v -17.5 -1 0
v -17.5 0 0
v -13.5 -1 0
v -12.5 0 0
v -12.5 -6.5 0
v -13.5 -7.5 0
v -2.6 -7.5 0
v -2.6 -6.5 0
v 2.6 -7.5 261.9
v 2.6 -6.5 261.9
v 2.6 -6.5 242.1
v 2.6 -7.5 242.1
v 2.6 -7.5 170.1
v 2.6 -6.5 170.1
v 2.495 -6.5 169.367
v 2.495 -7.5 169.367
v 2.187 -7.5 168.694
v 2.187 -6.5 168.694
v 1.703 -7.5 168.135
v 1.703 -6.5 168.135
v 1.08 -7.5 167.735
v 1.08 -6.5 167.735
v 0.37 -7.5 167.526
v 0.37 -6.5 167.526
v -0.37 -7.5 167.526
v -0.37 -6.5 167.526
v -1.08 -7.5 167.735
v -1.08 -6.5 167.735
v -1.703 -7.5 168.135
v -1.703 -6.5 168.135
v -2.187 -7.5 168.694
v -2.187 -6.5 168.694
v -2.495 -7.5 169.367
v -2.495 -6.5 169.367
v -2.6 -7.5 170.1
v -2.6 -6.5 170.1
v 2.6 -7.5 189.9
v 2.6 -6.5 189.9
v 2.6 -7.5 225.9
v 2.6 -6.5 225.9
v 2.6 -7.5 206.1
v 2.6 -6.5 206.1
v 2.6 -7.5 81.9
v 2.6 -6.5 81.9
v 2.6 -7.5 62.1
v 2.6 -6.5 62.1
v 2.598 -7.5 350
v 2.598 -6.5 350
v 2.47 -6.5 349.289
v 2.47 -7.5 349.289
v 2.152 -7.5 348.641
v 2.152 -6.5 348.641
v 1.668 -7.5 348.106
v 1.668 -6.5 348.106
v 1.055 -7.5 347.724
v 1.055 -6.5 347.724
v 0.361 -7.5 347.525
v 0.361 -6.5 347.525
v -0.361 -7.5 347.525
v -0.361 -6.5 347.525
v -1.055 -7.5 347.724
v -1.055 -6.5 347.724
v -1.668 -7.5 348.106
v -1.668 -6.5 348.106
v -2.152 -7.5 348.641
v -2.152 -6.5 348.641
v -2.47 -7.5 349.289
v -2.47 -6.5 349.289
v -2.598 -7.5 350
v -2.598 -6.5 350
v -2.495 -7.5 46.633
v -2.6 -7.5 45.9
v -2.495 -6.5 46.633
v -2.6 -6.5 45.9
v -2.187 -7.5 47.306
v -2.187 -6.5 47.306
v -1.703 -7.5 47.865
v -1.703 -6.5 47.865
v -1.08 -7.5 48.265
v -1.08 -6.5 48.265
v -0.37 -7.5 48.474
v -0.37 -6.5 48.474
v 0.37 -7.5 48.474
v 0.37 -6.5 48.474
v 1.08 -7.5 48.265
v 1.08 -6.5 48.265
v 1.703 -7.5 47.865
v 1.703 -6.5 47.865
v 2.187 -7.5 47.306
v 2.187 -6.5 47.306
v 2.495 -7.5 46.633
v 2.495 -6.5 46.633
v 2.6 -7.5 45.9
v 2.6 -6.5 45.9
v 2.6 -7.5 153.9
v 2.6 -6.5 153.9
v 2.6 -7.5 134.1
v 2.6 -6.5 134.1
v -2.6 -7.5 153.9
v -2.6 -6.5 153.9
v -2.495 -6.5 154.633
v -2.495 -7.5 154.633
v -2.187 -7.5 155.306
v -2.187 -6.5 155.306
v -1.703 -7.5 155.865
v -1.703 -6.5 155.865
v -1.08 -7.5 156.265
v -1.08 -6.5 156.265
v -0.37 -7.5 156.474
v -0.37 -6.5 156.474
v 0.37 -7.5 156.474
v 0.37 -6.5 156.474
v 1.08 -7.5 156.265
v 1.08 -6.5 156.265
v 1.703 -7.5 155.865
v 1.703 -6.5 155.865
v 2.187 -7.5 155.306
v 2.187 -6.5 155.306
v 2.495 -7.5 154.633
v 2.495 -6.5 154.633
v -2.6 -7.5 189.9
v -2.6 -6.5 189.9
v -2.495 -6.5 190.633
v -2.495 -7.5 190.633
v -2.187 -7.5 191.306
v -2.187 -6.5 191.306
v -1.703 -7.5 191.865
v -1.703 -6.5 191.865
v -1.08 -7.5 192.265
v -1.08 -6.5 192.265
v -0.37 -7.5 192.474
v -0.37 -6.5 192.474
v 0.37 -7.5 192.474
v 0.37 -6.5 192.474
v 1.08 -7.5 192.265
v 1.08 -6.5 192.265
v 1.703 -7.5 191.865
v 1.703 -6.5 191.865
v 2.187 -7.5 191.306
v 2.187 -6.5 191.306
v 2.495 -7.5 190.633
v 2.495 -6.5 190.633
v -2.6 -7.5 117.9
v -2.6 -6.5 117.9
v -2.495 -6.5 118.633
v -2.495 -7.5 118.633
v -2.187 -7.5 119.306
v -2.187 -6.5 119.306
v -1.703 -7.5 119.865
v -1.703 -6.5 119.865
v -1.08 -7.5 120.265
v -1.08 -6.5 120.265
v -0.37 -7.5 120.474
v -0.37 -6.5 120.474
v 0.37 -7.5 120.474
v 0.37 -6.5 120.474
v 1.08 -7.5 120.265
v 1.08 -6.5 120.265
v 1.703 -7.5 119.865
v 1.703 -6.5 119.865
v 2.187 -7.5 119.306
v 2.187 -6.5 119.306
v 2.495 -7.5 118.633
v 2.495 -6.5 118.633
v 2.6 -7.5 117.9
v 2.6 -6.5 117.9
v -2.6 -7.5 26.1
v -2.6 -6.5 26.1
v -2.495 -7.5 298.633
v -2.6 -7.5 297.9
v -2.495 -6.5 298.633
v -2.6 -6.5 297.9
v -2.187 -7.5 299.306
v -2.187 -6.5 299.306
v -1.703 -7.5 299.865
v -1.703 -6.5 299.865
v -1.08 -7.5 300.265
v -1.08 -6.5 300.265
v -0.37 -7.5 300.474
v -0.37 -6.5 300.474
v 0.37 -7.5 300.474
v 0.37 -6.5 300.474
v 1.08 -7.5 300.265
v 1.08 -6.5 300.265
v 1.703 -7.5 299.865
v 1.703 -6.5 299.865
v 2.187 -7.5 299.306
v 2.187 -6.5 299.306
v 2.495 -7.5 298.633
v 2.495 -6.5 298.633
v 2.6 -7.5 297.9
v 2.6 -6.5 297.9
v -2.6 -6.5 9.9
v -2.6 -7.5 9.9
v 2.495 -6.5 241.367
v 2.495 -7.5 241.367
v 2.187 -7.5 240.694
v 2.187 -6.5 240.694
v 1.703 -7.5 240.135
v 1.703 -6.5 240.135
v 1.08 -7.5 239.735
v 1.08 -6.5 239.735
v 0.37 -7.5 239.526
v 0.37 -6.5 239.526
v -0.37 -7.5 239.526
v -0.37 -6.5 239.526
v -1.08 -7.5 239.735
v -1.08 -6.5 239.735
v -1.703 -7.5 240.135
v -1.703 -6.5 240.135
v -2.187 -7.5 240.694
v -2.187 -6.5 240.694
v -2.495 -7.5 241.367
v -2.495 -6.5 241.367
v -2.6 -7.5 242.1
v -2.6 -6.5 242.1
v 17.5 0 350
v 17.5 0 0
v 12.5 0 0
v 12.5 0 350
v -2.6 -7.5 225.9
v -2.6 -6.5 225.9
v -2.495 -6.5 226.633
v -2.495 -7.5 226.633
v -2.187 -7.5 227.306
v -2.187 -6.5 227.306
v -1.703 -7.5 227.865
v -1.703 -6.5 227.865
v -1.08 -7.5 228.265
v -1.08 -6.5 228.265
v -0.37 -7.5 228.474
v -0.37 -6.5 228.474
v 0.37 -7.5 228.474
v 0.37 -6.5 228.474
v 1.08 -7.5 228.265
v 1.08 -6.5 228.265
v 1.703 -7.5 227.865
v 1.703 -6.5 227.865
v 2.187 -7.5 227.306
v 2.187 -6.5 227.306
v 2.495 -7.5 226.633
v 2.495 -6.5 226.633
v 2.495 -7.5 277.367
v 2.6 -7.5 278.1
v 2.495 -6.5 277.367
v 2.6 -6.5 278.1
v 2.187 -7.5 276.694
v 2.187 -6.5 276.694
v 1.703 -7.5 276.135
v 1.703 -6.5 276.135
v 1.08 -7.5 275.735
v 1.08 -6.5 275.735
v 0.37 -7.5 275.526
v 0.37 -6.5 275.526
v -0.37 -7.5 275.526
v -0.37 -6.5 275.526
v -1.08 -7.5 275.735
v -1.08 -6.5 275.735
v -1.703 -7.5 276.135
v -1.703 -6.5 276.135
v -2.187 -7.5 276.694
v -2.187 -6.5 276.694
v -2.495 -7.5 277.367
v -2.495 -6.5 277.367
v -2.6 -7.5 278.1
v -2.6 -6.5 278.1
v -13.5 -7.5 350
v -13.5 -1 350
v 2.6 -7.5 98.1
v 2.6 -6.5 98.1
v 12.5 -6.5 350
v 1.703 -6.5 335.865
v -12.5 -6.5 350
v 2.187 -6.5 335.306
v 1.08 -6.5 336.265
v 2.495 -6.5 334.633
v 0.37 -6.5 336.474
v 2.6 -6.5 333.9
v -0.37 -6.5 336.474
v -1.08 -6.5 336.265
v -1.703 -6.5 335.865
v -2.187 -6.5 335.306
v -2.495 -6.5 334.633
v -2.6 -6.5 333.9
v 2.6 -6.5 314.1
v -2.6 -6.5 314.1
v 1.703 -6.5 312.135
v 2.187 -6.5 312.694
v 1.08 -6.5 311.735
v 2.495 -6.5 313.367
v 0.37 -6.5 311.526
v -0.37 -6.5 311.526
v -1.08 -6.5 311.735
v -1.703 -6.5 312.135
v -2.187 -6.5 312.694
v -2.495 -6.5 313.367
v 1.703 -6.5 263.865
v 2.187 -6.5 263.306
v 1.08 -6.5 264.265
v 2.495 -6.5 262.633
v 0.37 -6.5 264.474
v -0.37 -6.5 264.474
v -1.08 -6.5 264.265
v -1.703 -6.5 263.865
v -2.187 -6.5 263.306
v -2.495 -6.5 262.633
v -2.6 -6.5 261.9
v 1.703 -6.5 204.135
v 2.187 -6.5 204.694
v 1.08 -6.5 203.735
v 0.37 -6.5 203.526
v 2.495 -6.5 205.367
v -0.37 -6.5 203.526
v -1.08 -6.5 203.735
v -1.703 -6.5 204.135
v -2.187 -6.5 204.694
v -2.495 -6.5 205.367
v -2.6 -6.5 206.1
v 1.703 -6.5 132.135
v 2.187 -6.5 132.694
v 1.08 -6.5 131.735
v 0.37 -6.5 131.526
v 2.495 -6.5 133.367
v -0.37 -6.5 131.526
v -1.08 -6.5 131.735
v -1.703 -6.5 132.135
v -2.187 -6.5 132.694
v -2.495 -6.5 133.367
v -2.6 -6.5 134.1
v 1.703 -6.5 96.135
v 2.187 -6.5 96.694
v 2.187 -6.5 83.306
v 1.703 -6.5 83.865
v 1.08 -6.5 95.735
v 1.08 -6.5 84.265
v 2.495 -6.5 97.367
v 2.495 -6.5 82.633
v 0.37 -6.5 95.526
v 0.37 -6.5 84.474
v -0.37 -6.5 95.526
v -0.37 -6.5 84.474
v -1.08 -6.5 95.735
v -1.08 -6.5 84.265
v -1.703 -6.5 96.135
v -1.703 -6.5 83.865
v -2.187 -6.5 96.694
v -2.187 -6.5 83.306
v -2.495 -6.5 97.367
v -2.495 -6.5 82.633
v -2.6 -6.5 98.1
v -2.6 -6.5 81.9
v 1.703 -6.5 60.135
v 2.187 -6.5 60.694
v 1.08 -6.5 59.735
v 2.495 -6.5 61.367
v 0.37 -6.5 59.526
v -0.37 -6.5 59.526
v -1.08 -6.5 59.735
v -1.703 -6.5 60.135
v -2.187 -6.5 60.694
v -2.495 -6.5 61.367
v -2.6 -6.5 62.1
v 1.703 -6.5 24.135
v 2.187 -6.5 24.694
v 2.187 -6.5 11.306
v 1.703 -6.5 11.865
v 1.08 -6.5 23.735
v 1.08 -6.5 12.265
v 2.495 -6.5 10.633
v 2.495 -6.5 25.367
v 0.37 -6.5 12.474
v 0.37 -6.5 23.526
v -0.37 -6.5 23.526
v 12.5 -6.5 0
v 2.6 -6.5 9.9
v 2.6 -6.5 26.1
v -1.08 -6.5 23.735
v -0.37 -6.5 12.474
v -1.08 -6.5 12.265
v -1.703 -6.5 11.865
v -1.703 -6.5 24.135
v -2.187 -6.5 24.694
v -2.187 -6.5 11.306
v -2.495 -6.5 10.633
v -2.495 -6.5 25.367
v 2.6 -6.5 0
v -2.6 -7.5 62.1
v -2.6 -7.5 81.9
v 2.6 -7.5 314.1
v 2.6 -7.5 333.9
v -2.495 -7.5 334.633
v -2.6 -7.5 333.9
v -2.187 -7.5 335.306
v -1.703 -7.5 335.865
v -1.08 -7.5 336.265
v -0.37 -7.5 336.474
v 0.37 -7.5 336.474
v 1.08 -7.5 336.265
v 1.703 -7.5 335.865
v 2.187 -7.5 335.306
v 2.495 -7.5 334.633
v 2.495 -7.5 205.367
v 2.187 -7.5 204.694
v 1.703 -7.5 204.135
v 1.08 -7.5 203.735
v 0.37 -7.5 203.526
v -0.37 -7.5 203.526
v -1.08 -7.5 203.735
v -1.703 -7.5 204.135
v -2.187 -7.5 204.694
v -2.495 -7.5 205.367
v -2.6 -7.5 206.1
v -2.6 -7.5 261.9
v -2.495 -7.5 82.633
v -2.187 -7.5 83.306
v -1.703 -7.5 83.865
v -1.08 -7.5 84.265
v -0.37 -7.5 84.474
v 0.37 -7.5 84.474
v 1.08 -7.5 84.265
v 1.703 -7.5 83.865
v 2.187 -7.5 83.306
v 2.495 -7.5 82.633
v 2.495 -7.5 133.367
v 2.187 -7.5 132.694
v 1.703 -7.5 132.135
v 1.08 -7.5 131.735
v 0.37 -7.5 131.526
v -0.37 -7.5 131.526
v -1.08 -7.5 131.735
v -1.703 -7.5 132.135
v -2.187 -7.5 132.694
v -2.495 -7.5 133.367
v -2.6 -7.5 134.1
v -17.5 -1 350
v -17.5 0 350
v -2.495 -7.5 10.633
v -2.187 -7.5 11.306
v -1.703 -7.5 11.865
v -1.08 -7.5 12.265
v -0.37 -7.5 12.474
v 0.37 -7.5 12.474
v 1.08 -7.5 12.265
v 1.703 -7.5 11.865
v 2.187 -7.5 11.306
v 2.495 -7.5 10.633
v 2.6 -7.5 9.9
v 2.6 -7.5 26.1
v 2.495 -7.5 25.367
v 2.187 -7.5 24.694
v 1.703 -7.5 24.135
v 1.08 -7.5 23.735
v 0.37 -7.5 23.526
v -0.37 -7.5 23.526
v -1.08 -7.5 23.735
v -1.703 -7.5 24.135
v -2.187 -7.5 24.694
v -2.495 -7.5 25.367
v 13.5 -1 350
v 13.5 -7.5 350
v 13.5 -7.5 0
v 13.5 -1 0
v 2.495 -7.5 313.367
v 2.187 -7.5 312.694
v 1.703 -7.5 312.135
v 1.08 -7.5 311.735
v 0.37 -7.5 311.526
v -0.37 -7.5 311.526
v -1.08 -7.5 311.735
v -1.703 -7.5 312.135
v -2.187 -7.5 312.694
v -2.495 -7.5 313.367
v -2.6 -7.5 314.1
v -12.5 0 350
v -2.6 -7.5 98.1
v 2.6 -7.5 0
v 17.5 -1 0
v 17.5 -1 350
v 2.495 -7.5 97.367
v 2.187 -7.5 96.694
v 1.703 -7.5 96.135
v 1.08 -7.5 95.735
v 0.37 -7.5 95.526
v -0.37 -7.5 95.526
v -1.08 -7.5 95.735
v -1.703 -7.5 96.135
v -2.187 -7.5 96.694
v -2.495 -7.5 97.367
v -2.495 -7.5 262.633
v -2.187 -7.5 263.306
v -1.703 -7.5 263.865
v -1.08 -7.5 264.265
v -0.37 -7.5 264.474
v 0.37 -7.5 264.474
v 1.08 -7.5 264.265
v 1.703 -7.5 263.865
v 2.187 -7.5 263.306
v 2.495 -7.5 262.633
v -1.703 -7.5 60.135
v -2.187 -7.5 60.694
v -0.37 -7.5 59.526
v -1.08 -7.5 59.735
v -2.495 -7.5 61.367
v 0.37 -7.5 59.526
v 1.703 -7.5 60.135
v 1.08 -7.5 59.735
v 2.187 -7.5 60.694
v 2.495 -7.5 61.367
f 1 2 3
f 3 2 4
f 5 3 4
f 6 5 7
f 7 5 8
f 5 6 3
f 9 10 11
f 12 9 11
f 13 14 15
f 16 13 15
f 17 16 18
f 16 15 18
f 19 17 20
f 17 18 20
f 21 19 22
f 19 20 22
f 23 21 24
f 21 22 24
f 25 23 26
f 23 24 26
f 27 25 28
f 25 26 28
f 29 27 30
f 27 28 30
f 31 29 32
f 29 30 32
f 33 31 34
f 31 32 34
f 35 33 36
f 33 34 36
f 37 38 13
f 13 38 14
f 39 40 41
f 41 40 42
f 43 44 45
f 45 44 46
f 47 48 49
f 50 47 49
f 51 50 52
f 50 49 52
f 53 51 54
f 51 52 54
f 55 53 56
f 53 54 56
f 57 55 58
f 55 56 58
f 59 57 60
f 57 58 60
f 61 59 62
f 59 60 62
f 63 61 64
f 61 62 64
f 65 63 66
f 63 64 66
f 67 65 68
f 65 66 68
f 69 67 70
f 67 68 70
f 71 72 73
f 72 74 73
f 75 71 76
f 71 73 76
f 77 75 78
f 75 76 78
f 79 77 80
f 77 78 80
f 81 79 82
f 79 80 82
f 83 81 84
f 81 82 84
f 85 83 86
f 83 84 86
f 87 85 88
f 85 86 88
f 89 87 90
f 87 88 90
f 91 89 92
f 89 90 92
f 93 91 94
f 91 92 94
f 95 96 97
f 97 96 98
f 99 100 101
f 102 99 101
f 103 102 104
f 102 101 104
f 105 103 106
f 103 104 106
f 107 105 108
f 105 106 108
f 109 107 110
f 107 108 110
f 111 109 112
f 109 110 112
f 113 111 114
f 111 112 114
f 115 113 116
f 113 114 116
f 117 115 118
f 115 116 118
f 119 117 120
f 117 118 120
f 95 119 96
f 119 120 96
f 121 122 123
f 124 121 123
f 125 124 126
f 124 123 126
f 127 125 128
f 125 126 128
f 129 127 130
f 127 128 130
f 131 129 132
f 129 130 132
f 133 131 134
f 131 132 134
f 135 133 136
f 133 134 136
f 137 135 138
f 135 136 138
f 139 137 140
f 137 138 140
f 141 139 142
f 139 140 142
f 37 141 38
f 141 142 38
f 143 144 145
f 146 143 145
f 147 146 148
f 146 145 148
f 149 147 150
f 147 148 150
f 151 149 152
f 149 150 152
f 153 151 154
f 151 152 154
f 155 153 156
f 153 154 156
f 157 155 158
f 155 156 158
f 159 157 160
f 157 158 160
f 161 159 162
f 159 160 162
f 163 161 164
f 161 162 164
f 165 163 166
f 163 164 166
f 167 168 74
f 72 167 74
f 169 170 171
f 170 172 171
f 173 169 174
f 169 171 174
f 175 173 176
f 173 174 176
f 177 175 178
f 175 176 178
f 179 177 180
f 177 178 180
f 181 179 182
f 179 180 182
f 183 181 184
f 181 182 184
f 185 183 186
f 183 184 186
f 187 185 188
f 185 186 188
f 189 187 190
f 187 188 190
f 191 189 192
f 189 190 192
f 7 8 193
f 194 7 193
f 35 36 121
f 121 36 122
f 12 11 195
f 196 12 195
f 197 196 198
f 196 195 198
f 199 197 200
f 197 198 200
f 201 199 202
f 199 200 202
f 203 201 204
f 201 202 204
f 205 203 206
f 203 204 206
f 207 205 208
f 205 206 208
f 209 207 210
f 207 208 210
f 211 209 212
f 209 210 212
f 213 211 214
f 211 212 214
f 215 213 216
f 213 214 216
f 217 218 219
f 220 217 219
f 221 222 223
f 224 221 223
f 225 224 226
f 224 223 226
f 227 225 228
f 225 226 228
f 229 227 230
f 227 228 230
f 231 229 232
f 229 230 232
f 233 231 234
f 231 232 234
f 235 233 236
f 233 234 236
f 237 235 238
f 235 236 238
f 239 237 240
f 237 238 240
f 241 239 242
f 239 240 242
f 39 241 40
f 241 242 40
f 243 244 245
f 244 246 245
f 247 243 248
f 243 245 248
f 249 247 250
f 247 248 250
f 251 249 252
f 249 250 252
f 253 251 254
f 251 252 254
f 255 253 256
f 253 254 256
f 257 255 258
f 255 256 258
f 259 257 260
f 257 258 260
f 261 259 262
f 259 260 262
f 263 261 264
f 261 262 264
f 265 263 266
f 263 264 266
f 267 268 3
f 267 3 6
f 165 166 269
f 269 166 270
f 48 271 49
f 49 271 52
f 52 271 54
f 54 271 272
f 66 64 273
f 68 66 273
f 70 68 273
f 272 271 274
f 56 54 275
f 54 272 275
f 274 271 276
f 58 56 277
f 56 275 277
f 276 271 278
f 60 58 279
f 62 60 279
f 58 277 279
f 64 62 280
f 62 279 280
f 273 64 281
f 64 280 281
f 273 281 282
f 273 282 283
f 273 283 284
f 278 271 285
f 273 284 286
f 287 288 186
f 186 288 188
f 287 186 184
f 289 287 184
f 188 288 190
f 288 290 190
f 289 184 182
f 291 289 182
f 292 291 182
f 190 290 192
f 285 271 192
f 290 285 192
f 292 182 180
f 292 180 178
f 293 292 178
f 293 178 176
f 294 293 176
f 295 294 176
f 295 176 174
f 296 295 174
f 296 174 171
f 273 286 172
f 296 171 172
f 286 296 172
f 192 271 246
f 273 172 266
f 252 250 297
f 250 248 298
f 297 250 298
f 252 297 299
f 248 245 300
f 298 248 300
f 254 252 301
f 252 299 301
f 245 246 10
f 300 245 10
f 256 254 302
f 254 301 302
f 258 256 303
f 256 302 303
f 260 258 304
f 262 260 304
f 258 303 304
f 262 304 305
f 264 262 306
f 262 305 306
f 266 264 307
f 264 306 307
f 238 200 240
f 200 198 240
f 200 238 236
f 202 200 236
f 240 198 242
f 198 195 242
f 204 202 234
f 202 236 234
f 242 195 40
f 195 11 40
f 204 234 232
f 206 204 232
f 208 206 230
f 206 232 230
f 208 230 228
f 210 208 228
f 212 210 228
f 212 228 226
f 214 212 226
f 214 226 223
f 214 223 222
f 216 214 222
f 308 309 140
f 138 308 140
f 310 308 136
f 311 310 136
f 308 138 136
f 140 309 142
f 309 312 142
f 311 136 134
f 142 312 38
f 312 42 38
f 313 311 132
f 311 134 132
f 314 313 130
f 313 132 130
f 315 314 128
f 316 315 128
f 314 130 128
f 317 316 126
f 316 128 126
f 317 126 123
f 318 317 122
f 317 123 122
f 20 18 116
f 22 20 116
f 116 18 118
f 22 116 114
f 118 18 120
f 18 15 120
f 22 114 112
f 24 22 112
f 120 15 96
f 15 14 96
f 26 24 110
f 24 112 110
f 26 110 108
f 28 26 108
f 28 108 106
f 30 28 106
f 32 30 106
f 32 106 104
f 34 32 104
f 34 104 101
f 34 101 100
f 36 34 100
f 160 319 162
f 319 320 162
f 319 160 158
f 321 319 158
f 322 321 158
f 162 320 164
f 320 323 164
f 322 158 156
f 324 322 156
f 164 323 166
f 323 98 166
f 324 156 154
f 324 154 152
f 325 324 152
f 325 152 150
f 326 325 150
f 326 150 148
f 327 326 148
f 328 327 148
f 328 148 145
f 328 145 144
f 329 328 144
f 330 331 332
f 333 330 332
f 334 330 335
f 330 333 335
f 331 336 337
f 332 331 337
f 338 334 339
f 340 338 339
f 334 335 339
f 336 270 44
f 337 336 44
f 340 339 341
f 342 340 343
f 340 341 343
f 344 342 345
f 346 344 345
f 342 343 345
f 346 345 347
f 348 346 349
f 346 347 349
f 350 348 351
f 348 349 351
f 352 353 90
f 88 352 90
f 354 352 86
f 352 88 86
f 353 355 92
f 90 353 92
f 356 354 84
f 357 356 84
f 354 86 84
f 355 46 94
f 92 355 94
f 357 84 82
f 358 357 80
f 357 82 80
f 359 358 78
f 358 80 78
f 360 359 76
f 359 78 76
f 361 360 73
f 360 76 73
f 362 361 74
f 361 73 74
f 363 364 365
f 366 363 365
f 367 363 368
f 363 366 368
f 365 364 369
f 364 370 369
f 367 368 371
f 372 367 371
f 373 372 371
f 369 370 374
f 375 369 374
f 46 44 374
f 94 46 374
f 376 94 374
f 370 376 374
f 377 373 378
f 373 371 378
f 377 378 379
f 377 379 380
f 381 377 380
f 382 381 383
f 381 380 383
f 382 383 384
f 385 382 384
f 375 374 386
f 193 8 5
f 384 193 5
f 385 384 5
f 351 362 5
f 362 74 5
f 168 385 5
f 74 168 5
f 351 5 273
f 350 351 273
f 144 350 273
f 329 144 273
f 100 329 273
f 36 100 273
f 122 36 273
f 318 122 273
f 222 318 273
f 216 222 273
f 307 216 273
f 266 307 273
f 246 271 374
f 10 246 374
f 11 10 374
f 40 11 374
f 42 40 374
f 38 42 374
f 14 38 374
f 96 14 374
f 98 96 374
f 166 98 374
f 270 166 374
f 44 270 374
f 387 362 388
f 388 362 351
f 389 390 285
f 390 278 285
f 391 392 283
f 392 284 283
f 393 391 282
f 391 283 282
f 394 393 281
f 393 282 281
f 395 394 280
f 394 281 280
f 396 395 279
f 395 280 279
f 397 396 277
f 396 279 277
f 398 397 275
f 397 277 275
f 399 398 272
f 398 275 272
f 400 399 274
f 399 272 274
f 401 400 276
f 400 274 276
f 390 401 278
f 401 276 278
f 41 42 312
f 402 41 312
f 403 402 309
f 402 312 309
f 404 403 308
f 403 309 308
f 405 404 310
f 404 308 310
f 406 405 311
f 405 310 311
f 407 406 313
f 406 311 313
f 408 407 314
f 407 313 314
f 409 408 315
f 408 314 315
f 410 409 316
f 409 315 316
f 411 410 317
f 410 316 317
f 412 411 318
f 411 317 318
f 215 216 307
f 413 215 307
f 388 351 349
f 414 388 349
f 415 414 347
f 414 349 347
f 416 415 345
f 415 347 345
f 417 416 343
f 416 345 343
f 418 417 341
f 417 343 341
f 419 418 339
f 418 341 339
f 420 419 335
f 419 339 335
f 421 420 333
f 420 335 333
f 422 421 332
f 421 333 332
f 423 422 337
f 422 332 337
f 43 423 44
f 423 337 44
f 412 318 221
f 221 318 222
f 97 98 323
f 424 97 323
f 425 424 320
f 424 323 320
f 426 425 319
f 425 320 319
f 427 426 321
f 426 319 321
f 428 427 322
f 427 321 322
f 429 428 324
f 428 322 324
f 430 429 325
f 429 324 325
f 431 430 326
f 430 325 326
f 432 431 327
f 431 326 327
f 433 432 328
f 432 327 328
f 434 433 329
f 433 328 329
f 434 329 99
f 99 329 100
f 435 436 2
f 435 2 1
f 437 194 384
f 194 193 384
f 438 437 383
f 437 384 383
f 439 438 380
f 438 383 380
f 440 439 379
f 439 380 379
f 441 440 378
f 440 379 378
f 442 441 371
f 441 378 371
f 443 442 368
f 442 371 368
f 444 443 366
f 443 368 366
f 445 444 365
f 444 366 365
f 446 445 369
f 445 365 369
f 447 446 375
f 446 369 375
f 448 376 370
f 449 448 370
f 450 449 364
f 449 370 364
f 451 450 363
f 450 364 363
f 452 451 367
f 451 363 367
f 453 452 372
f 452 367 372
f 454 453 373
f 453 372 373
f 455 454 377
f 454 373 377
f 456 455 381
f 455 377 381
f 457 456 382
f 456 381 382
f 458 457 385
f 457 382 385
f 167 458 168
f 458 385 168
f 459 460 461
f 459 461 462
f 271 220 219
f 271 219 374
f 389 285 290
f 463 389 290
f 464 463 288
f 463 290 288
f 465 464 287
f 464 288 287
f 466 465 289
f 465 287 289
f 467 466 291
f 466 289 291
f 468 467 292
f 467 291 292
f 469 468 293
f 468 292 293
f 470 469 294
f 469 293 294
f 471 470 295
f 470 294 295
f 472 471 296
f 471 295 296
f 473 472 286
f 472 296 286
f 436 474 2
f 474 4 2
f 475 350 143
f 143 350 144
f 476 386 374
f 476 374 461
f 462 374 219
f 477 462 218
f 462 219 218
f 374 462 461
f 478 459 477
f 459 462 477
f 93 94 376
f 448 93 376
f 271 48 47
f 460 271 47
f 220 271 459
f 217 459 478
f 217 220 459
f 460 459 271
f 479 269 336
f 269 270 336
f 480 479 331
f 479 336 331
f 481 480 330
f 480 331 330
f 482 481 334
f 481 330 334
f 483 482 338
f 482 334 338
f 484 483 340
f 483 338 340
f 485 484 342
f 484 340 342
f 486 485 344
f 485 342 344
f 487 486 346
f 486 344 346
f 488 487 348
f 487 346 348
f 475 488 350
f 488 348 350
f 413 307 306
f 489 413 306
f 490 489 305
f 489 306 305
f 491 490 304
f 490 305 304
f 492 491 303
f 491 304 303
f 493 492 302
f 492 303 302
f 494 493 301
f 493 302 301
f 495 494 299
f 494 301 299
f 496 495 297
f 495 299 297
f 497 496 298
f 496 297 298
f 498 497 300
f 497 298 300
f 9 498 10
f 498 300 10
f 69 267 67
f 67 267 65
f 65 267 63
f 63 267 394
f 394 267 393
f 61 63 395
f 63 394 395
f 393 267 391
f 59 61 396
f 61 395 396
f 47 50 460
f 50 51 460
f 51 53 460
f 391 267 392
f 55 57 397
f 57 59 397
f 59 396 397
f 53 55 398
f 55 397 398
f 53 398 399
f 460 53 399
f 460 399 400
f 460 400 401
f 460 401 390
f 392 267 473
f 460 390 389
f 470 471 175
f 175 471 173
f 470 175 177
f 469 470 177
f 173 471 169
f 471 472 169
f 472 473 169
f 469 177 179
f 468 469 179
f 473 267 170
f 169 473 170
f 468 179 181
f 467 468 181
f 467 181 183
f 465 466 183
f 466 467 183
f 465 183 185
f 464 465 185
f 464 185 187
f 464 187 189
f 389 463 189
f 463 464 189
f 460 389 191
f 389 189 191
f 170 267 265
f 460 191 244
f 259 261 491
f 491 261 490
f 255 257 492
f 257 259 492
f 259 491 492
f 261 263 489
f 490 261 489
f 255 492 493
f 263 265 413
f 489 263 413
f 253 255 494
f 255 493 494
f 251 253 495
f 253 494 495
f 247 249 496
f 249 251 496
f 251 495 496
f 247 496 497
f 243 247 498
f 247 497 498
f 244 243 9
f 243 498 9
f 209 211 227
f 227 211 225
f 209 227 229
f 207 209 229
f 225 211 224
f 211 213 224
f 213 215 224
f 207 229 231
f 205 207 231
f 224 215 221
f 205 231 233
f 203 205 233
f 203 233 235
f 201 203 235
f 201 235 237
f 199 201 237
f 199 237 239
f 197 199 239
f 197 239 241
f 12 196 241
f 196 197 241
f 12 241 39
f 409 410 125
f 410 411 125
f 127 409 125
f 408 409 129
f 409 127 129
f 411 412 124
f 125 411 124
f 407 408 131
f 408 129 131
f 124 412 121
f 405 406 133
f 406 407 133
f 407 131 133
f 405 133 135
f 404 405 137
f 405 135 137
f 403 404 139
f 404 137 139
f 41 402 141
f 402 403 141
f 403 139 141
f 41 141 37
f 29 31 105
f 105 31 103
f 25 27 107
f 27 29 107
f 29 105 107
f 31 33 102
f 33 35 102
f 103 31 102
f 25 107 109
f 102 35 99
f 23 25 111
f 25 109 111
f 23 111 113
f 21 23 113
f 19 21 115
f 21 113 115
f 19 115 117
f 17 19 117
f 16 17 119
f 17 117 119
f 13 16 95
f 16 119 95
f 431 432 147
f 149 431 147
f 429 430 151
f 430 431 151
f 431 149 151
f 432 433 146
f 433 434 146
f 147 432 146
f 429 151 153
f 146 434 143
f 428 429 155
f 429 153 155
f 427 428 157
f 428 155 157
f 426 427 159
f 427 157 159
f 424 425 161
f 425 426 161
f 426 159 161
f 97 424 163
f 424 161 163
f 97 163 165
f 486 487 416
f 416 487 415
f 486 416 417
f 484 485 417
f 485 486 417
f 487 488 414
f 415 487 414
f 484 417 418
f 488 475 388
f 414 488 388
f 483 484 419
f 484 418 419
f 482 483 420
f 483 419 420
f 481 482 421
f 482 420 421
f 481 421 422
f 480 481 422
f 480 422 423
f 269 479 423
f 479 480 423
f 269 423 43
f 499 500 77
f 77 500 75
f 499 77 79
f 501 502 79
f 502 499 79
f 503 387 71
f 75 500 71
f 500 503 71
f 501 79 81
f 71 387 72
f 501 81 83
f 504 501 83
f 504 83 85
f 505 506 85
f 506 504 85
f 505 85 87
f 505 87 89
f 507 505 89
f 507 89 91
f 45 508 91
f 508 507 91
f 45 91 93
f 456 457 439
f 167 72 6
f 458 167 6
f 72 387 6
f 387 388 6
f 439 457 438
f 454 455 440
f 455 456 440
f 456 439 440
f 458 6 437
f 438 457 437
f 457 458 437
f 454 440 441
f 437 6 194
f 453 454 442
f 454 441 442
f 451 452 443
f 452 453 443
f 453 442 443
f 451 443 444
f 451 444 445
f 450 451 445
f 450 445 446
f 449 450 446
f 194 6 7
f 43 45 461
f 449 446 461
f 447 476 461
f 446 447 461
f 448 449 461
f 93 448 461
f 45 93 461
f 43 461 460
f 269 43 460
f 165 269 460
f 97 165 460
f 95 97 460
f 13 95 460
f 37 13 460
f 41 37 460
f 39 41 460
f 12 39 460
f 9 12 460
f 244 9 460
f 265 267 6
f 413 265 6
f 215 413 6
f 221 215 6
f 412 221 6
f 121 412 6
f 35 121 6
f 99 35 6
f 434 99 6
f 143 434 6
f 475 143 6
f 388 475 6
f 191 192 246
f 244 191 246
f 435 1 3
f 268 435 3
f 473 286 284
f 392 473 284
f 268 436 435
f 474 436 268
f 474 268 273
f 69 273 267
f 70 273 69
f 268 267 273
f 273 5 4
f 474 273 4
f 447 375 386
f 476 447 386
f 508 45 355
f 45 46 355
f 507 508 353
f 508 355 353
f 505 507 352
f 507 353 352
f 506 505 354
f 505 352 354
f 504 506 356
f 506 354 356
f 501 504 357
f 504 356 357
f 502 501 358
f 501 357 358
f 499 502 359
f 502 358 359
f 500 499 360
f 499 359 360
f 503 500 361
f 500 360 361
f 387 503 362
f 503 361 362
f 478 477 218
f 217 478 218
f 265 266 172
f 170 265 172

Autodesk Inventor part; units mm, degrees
ref_plane "YZ Plane" through (0, 0, 0) normal (1, 0, 0) x (0, 1, 0)
ref_plane "XZ Plane" through (0, 0, 0) normal (0, 1, 0) x (-1, 0, 0)
ref_plane "XY Plane" through (0, 0, 0) normal (0, 0, 1) x (1, 0, 0)
sketch "Skizze_1" plane through (0, 0, 0) normal (0, 0, 1) x (1, 0, 0)
  line L0 (-17.5, 0) -> (-17.5, -1)
  line L1 (-17.5, -1) -> (-13.5, -1)
  line L2 (-13.5, -1) -> (-13.5, -7.5)
  line L3 (-13.5, -7.5) -> (13.5, -7.5)
  line L4 (13.5, -7.5) -> (13.5, -1)
  line L5 (13.5, -1) -> (17.5, -1)
  line L6 (17.5, -1) -> (17.5, 0)
  line L7 (17.5, 0) -> (12.5, 0)
  line L8 (12.5, 0) -> (12.5, -6.5)
  line L9 (12.5, -6.5) -> (-12.5, -6.5)
  line L10 (-12.5, -6.5) -> (-12.5, 0)
  line L11 (-12.5, 0) -> (-17.5, 0)
extrude "Extrusion1" add sketch "Skizze_1" along normal blind 350
sketch "sketch_roundrect_1" plane through (0, 0, 0) normal (0, 1, 0) x (-1, 0, 0)
  arc A0 (2.6, 9.9) -> (-2.6, 9.9) centre (0, 9.9) ccw
  line L0 (-2.6, 9.9) -> (-2.6, -9.9)
  arc A1 (-2.6, -9.9) -> (2.6, -9.9) centre (0, -9.9) ccw
  line L1 (2.6, -9.9) -> (2.6, 9.9)
extrude "Extrusion2" cut sketch "sketch_roundrect_1" against normal blind 50
sketch "sketch_roundrect_2" plane through (0, 0, 0) normal (0, 1, 0) x (-1, 0, 0)
  arc A0 (2.6, 45.9) -> (-2.6, 45.9) centre (0, 45.9) ccw
  line L0 (-2.6, 45.9) -> (-2.6, 26.1)
  arc A1 (-2.6, 26.1) -> (2.6, 26.1) centre (0, 26.1) ccw
  line L1 (2.6, 26.1) -> (2.6, 45.9)
extrude "Extrusion3" cut sketch "sketch_roundrect_2" against normal blind 50
sketch "sketch_roundrect_3" plane through (0, 0, 0) normal (0, 1, 0) x (-1, 0, 0)
  arc A0 (2.6, 81.9) -> (-2.6, 81.9) centre (0, 81.9) ccw
  line L0 (-2.6, 81.9) -> (-2.6, 62.1)
  arc A1 (-2.6, 62.1) -> (2.6, 62.1) centre (0, 62.1) ccw
  line L1 (2.6, 62.1) -> (2.6, 81.9)
extrude "Extrusion4" cut sketch "sketch_roundrect_3" against normal blind 50
sketch "sketch_roundrect_4" plane through (0, 0, 0) normal (0, 1, 0) x (-1, 0, 0)
  arc A0 (2.6, 117.9) -> (-2.6, 117.9) centre (0, 117.9) ccw
  line L0 (-2.6, 117.9) -> (-2.6, 98.1)
  arc A1 (-2.6, 98.1) -> (2.6, 98.1) centre (0, 98.1) ccw
  line L1 (2.6, 98.1) -> (2.6, 117.9)
extrude "Extrusion5" cut sketch "sketch_roundrect_4" against normal blind 50
sketch "sketch_roundrect_5" plane through (0, 0, 0) normal (0, 1, 0) x (-1, 0, 0)
  arc A0 (2.6, 153.9) -> (-2.6, 153.9) centre (0, 153.9) ccw
  line L0 (-2.6, 153.9) -> (-2.6, 134.1)
  arc A1 (-2.6, 134.1) -> (2.6, 134.1) centre (0, 134.1) ccw
  line L1 (2.6, 134.1) -> (2.6, 153.9)
extrude "Extrusion6" cut sketch "sketch_roundrect_5" against normal blind 50
sketch "sketch_roundrect_6" plane through (0, 0, 0) normal (0, 1, 0) x (-1, 0, 0)
  arc A0 (2.6, 189.9) -> (-2.6, 189.9) centre (0, 189.9) ccw
  line L0 (-2.6, 189.9) -> (-2.6, 170.1)
  arc A1 (-2.6, 170.1) -> (2.6, 170.1) centre (0, 170.1) ccw
  line L1 (2.6, 170.1) -> (2.6, 189.9)
extrude "Extrusion7" cut sketch "sketch_roundrect_6" against normal blind 50
sketch "sketch_roundrect_7" plane through (0, 0, 0) normal (0, 1, 0) x (-1, 0, 0)
  arc A0 (2.6, 225.9) -> (-2.6, 225.9) centre (0, 225.9) ccw
  line L0 (-2.6, 225.9) -> (-2.6, 206.1)
  arc A1 (-2.6, 206.1) -> (2.6, 206.1) centre (0, 206.1) ccw
  line L1 (2.6, 206.1) -> (2.6, 225.9)
extrude "Extrusion8" cut sketch "sketch_roundrect_7" against normal blind 50
sketch "sketch_roundrect_8" plane through (0, 0, 0) normal (0, 1, 0) x (-1, 0, 0)
  arc A0 (2.6, 261.9) -> (-2.6, 261.9) centre (0, 261.9) ccw
  line L0 (-2.6, 261.9) -> (-2.6, 242.1)
  arc A1 (-2.6, 242.1) -> (2.6, 242.1) centre (0, 242.1) ccw
  line L1 (2.6, 242.1) -> (2.6, 261.9)
extrude "Extrusion9" cut sketch "sketch_roundrect_8" against normal blind 50
sketch "sketch_roundrect_9" plane through (0, 0, 0) normal (0, 1, 0) x (-1, 0, 0)
  arc A0 (2.6, 297.9) -> (-2.6, 297.9) centre (0, 297.9) ccw
  line L0 (-2.6, 297.9) -> (-2.6, 278.1)
  arc A1 (-2.6, 278.1) -> (2.6, 278.1) centre (0, 278.1) ccw
  line L1 (2.6, 278.1) -> (2.6, 297.9)
extrude "Extrusion10" cut sketch "sketch_roundrect_9" against normal blind 50
sketch "sketch_roundrect_10" plane through (0, 0, 0) normal (0, 1, 0) x (-1, 0, 0)
  arc A0 (2.6, 333.9) -> (-2.6, 333.9) centre (0, 333.9) ccw
  line L0 (-2.6, 333.9) -> (-2.6, 314.1)
  arc A1 (-2.6, 314.1) -> (2.6, 314.1) centre (0, 314.1) ccw
  line L1 (2.6, 314.1) -> (2.6, 333.9)
extrude "Extrusion11" cut sketch "sketch_roundrect_10" against normal blind 50
sketch "sketch_roundrect_11" plane through (0, 0, 0) normal (0, 1, 0) x (-1, 0, 0)
  arc A0 (2.6, 369.9) -> (-2.6, 369.9) centre (0, 369.9) ccw
  line L0 (-2.6, 369.9) -> (-2.6, 350.1)
  arc A1 (-2.6, 350.1) -> (2.6, 350.1) centre (0, 350.1) ccw
  line L1 (2.6, 350.1) -> (2.6, 369.9)
extrude "Extrusion12" cut sketch "sketch_roundrect_11" against normal blind 50
properties part number "WAGO_210-112350"
